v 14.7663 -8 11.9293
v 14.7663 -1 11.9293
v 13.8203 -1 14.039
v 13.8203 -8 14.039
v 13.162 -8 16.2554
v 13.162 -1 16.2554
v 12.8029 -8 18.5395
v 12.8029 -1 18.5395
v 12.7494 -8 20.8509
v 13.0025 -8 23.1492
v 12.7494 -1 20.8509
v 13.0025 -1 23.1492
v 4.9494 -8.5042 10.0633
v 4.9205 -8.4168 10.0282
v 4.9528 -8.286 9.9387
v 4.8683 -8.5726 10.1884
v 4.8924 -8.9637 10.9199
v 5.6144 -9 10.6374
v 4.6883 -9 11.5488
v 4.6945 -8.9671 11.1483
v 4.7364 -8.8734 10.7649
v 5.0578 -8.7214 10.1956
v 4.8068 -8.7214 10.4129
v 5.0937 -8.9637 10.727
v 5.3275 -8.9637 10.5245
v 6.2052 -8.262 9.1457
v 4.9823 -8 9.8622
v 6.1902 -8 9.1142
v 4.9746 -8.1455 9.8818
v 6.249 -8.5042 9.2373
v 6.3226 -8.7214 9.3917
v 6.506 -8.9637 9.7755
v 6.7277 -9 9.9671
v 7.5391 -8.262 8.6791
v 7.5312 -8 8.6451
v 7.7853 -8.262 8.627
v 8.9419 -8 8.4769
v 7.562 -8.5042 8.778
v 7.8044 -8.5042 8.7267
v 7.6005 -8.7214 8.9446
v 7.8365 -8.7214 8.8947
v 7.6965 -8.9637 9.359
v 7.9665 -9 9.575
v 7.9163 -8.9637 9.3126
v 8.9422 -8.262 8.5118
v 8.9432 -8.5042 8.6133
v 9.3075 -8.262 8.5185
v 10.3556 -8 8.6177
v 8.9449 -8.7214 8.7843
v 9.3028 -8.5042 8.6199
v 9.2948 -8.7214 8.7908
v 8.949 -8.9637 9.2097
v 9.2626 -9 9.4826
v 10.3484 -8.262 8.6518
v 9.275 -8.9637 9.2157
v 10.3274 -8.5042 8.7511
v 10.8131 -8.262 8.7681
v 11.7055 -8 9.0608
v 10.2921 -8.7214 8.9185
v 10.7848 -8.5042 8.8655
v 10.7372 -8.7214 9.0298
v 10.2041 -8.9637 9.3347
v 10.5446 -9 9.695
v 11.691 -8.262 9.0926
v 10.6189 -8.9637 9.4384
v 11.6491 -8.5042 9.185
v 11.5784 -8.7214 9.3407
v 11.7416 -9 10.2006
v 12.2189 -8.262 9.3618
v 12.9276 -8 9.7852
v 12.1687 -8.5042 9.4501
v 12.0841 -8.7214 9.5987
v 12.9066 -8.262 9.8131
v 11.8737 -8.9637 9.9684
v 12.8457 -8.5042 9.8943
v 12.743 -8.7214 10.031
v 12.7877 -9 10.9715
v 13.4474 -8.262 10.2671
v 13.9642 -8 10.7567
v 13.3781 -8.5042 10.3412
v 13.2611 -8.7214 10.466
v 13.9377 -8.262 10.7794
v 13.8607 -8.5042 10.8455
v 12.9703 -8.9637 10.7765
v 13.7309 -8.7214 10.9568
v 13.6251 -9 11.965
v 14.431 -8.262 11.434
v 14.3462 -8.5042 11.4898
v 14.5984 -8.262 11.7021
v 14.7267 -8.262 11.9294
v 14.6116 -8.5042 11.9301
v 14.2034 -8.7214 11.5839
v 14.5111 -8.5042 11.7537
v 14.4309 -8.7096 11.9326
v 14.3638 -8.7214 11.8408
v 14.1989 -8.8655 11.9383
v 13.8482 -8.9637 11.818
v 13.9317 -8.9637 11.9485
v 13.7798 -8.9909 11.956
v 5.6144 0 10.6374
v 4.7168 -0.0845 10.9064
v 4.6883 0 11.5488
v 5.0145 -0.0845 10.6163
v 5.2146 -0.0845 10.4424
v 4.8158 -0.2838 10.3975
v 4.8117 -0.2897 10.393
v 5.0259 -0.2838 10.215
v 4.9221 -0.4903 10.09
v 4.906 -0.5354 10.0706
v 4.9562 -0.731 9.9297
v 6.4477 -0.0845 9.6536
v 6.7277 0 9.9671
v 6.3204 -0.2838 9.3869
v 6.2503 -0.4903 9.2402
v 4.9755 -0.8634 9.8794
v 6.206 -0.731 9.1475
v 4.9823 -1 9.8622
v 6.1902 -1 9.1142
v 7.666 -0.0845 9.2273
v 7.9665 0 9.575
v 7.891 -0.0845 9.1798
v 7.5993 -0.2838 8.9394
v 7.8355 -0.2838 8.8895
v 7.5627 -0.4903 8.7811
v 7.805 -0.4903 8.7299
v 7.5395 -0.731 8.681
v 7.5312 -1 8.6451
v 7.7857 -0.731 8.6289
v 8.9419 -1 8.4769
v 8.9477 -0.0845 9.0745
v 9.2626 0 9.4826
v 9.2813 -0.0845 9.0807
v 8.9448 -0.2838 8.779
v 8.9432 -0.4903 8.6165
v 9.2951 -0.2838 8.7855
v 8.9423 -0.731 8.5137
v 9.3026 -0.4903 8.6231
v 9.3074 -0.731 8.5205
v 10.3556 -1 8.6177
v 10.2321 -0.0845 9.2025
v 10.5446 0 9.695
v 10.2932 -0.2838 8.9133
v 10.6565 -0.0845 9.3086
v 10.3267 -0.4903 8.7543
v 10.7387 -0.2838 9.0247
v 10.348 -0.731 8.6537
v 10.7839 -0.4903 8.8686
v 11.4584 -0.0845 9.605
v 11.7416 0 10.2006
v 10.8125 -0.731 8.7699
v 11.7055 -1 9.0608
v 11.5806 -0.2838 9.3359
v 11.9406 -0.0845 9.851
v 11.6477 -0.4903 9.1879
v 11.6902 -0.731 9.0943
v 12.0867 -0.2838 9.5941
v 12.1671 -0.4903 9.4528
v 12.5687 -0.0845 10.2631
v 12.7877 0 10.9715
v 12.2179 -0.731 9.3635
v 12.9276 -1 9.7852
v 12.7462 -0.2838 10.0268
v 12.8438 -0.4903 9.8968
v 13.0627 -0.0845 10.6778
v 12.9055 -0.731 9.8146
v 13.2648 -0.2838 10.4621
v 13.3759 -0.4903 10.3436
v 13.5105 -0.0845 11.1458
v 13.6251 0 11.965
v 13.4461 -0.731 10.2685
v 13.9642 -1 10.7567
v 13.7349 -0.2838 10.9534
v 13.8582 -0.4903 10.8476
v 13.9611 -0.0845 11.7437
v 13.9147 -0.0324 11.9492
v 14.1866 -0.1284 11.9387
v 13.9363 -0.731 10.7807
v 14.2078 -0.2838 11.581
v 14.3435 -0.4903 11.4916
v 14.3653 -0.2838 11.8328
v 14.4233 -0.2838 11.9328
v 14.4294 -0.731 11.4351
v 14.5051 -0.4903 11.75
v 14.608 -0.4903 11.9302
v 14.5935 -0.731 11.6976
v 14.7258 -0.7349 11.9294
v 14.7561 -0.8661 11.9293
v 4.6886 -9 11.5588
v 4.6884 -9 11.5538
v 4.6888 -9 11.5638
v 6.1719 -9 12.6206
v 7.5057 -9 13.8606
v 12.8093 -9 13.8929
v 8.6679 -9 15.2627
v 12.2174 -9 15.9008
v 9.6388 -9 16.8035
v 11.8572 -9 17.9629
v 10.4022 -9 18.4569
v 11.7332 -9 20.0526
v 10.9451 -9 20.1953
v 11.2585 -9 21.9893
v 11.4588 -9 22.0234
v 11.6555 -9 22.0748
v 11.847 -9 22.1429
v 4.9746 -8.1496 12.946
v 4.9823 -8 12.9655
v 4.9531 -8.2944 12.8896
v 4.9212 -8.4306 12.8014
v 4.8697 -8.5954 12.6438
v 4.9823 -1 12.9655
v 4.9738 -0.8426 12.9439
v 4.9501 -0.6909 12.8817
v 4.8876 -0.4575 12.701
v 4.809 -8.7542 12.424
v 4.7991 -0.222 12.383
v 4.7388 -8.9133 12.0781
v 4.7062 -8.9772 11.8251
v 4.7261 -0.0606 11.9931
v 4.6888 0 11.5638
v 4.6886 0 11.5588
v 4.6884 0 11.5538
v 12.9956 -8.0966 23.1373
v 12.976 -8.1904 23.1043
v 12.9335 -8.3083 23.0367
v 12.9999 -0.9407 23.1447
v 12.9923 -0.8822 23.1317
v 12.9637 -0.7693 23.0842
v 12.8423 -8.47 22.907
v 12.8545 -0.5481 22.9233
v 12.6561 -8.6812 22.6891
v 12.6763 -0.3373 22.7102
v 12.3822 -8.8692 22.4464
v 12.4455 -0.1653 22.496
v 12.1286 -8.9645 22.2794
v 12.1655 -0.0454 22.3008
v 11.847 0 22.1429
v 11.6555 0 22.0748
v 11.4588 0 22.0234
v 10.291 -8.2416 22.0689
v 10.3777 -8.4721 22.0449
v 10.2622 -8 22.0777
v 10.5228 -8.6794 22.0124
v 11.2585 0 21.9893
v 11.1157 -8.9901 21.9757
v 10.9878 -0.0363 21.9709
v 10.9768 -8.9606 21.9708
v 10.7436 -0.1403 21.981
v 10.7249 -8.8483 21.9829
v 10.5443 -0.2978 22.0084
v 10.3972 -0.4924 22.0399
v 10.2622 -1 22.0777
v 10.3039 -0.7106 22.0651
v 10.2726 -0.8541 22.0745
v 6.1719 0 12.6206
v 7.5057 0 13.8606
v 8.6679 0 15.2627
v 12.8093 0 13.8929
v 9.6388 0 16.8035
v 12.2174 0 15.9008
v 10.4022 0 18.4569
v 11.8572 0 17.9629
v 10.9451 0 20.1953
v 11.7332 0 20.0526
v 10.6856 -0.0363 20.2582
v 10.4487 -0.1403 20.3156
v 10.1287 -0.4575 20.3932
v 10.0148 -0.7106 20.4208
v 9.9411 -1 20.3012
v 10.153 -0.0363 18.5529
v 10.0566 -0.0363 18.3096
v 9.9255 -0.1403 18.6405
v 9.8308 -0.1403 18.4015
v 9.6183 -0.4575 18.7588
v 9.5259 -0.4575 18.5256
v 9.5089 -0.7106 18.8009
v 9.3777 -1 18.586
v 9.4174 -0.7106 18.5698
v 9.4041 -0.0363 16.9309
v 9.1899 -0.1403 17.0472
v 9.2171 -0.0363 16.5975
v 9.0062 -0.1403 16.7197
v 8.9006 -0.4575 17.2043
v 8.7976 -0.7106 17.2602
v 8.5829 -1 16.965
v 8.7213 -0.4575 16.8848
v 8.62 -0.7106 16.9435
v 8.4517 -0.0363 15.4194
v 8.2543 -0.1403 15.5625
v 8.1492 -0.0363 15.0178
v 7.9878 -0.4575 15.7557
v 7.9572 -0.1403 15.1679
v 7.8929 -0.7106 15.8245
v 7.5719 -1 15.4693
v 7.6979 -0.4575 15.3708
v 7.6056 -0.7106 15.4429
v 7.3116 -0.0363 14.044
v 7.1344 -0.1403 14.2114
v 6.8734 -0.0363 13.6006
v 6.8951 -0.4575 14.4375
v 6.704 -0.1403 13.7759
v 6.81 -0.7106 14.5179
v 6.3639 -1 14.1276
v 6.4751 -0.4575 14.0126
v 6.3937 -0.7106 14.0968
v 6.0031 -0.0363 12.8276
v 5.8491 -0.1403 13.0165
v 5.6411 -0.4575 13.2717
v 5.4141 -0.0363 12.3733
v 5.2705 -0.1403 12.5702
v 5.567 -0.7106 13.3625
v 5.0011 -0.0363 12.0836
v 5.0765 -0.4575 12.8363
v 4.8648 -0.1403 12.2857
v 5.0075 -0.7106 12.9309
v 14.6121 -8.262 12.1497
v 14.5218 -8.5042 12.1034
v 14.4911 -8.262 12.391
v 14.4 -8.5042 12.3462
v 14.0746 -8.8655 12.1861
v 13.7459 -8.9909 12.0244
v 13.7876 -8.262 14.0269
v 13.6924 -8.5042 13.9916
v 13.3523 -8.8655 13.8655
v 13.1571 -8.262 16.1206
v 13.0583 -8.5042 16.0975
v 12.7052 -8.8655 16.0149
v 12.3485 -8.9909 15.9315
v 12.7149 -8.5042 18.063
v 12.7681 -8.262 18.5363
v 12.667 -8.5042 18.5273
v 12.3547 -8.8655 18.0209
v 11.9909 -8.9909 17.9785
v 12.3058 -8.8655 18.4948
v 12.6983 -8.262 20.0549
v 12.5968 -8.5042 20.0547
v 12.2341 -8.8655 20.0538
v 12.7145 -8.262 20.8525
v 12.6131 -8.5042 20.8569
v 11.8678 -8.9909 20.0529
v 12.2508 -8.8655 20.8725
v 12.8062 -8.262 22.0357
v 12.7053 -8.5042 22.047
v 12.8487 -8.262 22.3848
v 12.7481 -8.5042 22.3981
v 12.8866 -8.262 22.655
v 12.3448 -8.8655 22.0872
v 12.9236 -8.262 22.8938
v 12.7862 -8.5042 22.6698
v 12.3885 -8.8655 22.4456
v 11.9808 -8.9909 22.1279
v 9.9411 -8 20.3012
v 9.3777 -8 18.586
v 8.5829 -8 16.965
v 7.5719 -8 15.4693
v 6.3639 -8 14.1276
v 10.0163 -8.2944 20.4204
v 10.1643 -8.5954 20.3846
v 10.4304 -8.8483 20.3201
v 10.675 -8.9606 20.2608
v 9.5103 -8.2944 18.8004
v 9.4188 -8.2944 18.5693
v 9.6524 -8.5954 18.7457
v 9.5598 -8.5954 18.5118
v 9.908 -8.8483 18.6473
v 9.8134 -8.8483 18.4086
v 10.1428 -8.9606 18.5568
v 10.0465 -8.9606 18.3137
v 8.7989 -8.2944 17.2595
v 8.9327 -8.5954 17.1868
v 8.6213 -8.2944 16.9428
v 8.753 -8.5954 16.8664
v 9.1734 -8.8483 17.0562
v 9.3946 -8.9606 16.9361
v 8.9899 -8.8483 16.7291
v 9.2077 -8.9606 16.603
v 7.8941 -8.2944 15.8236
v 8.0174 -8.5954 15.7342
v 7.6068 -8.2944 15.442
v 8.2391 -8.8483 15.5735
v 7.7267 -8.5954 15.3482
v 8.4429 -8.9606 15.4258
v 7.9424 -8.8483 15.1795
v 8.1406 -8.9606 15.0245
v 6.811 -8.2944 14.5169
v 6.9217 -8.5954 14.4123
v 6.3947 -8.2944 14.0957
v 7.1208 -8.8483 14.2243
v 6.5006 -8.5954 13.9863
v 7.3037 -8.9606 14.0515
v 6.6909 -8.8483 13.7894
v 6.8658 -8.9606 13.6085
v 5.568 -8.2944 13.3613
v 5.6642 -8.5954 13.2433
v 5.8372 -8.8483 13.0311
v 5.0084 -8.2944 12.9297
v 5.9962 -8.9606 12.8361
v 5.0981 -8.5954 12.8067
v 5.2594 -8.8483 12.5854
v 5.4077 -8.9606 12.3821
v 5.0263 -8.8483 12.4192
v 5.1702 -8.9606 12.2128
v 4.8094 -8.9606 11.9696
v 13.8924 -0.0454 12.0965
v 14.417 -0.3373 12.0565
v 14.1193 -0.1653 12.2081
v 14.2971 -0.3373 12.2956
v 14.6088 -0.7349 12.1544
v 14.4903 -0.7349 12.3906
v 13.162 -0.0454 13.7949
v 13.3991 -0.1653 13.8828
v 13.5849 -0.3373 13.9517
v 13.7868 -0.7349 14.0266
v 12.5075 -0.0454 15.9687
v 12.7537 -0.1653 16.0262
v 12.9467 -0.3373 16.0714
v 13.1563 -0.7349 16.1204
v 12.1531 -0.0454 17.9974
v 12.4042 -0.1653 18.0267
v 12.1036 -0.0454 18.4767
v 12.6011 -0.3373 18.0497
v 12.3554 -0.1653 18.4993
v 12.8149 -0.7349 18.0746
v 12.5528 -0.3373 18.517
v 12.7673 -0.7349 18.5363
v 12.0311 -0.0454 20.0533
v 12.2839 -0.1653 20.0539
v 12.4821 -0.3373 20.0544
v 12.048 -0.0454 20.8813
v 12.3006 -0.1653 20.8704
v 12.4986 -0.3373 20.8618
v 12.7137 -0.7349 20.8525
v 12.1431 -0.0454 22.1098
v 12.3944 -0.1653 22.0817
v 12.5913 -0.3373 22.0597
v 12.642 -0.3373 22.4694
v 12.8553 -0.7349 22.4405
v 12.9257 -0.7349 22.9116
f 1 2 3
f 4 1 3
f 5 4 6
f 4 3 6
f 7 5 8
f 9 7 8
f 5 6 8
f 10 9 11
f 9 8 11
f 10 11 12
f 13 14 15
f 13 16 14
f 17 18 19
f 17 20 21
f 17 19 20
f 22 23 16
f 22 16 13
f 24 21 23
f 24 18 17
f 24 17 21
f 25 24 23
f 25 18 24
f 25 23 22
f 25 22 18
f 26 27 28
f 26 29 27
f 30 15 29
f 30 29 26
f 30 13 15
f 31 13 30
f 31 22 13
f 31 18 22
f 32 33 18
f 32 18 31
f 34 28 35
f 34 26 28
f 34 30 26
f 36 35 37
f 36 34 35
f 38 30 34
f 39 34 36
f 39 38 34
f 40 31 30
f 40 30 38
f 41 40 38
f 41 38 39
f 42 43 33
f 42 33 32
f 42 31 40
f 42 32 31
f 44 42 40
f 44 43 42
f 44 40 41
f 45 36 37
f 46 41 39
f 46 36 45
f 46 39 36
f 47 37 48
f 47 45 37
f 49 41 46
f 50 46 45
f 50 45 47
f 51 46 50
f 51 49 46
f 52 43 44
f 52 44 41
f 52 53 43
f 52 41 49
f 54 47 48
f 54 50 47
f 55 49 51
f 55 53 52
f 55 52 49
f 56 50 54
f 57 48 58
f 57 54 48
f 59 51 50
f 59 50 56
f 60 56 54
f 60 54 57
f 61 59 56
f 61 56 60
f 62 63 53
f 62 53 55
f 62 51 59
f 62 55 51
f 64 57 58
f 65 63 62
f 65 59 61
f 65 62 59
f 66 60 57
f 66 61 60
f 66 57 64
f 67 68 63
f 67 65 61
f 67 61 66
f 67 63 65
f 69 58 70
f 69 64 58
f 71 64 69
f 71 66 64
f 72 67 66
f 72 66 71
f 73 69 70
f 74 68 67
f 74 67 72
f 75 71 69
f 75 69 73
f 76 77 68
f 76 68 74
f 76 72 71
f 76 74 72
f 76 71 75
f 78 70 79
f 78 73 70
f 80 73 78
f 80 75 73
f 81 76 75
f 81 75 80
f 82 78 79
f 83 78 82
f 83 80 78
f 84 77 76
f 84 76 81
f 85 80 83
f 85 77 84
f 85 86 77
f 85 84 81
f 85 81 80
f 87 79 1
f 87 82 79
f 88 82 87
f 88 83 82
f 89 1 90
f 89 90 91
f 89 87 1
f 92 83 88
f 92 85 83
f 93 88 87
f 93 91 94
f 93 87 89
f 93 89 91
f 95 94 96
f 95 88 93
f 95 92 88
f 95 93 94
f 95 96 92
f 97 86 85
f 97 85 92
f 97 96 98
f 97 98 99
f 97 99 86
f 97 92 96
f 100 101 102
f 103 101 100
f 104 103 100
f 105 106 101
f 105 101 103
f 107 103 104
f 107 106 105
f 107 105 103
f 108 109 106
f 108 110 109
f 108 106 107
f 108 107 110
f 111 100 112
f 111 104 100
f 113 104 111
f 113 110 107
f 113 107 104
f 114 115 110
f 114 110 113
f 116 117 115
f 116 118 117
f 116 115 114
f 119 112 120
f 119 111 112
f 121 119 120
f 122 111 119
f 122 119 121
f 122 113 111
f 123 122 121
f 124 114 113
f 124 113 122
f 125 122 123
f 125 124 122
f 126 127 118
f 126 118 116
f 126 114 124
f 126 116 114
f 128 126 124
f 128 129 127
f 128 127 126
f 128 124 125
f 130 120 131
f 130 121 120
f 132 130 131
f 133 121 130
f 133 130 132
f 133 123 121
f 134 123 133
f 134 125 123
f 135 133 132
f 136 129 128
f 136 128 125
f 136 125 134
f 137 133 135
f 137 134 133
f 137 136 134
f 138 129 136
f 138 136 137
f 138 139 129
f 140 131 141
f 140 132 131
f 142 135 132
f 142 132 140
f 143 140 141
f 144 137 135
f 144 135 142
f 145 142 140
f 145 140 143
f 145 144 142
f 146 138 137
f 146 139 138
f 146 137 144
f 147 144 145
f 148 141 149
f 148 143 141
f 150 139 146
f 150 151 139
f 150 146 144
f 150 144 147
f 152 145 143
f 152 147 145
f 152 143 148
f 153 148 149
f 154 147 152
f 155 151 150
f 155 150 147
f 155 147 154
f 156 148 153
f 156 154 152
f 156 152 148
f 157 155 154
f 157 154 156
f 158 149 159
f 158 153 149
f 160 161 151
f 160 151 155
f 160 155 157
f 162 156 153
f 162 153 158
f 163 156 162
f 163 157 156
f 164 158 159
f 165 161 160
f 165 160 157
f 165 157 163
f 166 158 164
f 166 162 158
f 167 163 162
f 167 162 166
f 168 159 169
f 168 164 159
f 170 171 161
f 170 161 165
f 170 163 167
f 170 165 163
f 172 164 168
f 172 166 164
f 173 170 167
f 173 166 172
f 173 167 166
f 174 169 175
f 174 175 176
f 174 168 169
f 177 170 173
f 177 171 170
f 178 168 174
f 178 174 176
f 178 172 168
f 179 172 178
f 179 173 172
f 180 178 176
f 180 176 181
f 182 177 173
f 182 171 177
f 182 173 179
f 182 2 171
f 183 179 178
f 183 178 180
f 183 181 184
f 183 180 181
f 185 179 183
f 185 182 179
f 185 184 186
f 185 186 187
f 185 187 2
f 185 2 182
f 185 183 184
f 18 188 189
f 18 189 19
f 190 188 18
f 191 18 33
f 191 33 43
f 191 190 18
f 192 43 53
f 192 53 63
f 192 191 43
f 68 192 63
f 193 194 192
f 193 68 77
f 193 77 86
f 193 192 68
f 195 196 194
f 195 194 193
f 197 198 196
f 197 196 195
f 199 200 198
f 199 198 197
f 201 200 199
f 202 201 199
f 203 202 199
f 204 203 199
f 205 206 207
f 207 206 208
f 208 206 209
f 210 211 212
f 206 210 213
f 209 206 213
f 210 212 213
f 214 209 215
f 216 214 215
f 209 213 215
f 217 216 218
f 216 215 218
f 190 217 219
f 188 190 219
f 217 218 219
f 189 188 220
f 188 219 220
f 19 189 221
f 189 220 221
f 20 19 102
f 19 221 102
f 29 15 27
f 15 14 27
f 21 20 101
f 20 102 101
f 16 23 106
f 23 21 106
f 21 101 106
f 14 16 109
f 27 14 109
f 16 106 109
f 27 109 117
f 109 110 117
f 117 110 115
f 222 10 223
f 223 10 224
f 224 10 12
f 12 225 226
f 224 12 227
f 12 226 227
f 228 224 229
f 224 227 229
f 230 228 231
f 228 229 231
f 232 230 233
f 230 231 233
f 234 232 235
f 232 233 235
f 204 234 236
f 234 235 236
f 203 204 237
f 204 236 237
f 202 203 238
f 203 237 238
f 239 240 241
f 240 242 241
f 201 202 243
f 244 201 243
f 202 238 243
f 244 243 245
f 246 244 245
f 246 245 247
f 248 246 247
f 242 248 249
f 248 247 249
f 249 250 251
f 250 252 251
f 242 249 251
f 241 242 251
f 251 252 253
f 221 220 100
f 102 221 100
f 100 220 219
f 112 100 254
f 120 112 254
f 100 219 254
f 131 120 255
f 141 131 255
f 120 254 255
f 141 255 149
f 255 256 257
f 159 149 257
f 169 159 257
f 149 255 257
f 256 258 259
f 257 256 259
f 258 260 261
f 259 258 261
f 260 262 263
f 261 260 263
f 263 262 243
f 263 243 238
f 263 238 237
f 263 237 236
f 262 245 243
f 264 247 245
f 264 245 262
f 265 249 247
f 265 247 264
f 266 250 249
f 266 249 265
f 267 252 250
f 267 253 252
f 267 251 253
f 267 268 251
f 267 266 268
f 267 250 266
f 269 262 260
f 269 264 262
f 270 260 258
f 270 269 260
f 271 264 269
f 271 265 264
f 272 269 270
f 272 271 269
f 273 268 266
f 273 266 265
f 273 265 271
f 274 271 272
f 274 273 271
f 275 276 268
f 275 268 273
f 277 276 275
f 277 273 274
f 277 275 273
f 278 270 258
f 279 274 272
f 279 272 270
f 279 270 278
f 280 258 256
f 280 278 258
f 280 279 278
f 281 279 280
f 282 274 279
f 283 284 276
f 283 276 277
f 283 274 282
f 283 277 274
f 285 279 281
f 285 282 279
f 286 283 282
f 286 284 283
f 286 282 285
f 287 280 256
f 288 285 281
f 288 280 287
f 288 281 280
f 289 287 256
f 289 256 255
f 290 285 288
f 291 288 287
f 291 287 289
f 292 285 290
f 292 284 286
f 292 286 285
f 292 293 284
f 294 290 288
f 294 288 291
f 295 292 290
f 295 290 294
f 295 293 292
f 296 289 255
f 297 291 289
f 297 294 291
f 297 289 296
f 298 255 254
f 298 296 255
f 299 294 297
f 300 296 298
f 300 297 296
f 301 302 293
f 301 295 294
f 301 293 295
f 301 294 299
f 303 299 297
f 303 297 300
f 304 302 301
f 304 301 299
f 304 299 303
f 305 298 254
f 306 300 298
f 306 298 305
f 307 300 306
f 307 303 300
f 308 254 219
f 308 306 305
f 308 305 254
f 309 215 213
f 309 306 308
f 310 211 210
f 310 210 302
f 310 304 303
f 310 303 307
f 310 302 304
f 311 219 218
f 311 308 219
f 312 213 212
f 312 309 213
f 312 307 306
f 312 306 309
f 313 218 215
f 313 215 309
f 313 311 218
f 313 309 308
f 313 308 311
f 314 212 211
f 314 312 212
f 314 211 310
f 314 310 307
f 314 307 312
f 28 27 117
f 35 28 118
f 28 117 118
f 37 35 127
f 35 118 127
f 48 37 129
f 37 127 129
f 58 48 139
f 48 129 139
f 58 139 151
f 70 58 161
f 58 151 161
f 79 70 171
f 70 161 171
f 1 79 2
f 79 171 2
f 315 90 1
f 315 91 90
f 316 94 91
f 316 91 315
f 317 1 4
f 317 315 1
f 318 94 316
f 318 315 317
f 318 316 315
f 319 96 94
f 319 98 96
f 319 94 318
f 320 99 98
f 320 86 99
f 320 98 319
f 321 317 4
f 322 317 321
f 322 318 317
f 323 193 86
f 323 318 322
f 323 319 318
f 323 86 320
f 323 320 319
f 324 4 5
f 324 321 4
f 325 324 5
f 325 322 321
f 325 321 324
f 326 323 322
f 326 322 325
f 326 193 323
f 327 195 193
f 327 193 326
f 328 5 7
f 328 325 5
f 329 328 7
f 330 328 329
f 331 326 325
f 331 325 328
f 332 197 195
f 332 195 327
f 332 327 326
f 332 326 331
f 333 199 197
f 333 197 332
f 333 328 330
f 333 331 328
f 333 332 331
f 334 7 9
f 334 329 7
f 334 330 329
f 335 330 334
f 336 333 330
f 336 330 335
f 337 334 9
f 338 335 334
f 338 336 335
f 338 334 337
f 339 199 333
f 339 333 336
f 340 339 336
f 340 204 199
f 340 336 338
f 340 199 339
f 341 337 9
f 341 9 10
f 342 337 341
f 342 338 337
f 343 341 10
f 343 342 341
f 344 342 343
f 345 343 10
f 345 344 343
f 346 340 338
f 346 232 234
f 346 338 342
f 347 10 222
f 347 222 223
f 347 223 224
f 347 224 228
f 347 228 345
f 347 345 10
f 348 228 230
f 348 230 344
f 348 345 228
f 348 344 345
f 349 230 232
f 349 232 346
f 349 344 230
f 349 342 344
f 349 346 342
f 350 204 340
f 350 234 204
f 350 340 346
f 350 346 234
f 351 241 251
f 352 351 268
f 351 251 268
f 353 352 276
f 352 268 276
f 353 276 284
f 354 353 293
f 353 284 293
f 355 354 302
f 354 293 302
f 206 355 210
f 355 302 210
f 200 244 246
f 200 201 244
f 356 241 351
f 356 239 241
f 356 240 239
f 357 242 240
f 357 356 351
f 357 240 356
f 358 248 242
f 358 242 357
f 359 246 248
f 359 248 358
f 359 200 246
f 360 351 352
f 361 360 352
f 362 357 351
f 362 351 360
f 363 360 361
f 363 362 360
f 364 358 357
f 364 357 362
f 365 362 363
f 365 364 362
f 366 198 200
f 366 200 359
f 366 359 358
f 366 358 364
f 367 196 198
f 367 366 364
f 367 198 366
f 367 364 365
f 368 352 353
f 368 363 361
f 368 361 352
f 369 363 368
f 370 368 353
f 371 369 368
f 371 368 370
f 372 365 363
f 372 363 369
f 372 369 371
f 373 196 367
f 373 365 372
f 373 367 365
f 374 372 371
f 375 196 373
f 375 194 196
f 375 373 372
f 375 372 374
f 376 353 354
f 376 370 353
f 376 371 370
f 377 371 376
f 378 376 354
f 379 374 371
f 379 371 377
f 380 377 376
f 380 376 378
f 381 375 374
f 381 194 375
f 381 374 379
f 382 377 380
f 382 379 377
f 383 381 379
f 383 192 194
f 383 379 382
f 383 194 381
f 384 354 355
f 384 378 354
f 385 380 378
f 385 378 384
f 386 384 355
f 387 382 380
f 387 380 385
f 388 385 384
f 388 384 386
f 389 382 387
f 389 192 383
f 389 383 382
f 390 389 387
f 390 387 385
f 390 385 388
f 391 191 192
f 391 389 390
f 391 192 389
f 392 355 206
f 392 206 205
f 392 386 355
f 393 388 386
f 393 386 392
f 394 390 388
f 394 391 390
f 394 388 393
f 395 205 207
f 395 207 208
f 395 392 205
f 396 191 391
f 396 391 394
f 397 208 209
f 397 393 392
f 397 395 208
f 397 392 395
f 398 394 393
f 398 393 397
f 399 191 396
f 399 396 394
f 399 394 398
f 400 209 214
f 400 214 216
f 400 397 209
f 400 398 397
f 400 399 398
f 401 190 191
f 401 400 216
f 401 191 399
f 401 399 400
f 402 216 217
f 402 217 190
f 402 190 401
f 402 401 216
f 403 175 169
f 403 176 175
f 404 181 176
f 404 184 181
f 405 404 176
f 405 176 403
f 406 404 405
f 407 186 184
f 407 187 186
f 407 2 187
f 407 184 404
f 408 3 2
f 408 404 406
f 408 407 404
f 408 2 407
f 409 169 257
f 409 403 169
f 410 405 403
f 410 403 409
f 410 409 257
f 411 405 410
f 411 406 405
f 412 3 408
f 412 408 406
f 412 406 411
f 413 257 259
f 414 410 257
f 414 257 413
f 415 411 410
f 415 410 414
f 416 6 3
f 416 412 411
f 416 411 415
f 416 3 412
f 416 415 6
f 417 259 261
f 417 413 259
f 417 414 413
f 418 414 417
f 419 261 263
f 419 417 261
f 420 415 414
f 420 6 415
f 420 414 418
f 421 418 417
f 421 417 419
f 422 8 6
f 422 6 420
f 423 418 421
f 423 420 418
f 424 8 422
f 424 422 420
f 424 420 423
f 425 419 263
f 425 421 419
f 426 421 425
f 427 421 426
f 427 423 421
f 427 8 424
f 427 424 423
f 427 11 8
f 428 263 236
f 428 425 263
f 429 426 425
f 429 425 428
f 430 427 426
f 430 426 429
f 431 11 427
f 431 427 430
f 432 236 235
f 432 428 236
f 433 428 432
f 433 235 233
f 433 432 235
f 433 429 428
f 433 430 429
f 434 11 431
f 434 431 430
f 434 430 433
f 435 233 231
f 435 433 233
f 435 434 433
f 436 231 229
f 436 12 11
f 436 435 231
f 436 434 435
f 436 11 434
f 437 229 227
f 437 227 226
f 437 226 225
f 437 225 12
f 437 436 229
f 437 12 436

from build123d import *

# Parameters (mm, degrees)
F1_DEPTH    = 9
F2_T2_ANGLE = 69.5952889026
F2_T4_ANGLE = 54.4883301746
F2_T6_ANGLE = 143.7551987737
F3_R        = 1


# Not quite as in the source:
# - a fillet or chamfer that OpenCascade refuses, or shapes differently, is made with other operations: its cross-section is extruded or revolved along the edge and cut away or added


with BuildPart() as f1:
    # F0 (on Front) → F1 (new body)
    with BuildSketch(Plane.XZ):
        with BuildLine():
            ThreePointArc((14.7663247772, 11.9293080643), (12.944509625, 17.3914763041), (13.0025018007, 23.1491606683))
            ThreePointArc((13.0025018007, 23.1491606683), (11.8204746449, 22.132281974), (10.26218878, 22.0777325565))
            ThreePointArc((10.26218878, 22.0777325565), (8.5829178564, 16.9649844736), (4.9823031081, 12.9655198559))
            ThreePointArc((4.9823031081, 12.9655198559), (4.6861100149, 11.4138618351), (4.9823031081, 9.8622038143))
            ThreePointArc((4.9823031081, 9.8622038143), (10.3556125988, 8.6176722475), (14.7663247772, 11.9293080643))
        make_face()
    extrude(amount=F1_DEPTH)

    # F2: fillet of radius 1 on 3 edges, made by hand

    # F2_s1 → F2_t2 (revolve, cut)
    with BuildSketch(Plane(origin=(-1.9409501927, 0, 23.5660641142), x_dir=(0, 1, 0), z_dir=(-0.0820841468, 0, 0.9966254025))):
        with BuildLine():
            ThreePointArc((-8, -12.2787262208), (-8.7071067812, -12.5716194396), (-9, -13.2787262208))
            Line((-9, -13.2787262208), (-9, -12.2787262208))
            Line((-9, -12.2787262208), (-8, -12.2787262208))
        make_face()
    revolve(axis=Axis((-2.70136938, -9, 23.5034344039), (0, 1, 0)), revolution_arc=F2_T2_ANGLE, mode=Mode.SUBTRACT)

    # F2_s3 → F2_t4 (revolve, cut)
    with BuildSketch(Plane(origin=(0.9320888174, 0, -1.2745523028), x_dir=(0, 1, 0), z_dir=(0.5902994367, 0, -0.8071843501))):
        with BuildLine():
            ThreePointArc((-8, 18.7819322745), (-8.7071067812, 18.4890390557), (-9, 17.7819322745))
            Line((-9, 17.7819322745), (-9, 18.7819322745))
            Line((-9, 18.7819322745), (-8, 18.7819322745))
        make_face()
    revolve(axis=Axis((30.156216129, -9, 20.0972519028), (0, 1, 0)), revolution_arc=F2_T4_ANGLE, mode=Mode.SUBTRACT)

    # F2_s5 → F2_t6 (revolve, cut)
    with BuildSketch(Plane(origin=(-4.2476398352, 0, 7.3417188573), x_dir=(0, 1, 0), z_dir=(-0.5007864485, 0, 0.8655708712))):
        with BuildLine():
            ThreePointArc((-8, -8.7783825872), (-8.7071067812, -9.071275806), (-9, -9.7783825872))
            Line((-9, -9.7783825872), (-9, -8.7783825872))
            Line((-9, -8.7783825872), (-8, -8.7783825872))
        make_face()
    revolve(axis=Axis((9.0052261238, -9, 15.0093240152), (0, -1, 0)), revolution_arc=F2_T6_ANGLE, mode=Mode.SUBTRACT)

    # F3#2 (call 1 of 2: OpenCascade refuses the feature's edges together)
    f3_2_edges = [f1.edges().sort_by_distance(p)[0] for p in [
        (8.582918, 0, 16.964984),
    ]]
    fillet(f3_2_edges, radius=F3_R)

    # F3 (call 2 of 2)
    f3_edges = [f1.edges().sort_by_distance(p)[0] for p in [
        (12.94451, 0, 17.391476),
        (10.355613, 0, 8.617672),
    ]]
    fillet(f3_edges, radius=F3_R)


solid = f1.part
